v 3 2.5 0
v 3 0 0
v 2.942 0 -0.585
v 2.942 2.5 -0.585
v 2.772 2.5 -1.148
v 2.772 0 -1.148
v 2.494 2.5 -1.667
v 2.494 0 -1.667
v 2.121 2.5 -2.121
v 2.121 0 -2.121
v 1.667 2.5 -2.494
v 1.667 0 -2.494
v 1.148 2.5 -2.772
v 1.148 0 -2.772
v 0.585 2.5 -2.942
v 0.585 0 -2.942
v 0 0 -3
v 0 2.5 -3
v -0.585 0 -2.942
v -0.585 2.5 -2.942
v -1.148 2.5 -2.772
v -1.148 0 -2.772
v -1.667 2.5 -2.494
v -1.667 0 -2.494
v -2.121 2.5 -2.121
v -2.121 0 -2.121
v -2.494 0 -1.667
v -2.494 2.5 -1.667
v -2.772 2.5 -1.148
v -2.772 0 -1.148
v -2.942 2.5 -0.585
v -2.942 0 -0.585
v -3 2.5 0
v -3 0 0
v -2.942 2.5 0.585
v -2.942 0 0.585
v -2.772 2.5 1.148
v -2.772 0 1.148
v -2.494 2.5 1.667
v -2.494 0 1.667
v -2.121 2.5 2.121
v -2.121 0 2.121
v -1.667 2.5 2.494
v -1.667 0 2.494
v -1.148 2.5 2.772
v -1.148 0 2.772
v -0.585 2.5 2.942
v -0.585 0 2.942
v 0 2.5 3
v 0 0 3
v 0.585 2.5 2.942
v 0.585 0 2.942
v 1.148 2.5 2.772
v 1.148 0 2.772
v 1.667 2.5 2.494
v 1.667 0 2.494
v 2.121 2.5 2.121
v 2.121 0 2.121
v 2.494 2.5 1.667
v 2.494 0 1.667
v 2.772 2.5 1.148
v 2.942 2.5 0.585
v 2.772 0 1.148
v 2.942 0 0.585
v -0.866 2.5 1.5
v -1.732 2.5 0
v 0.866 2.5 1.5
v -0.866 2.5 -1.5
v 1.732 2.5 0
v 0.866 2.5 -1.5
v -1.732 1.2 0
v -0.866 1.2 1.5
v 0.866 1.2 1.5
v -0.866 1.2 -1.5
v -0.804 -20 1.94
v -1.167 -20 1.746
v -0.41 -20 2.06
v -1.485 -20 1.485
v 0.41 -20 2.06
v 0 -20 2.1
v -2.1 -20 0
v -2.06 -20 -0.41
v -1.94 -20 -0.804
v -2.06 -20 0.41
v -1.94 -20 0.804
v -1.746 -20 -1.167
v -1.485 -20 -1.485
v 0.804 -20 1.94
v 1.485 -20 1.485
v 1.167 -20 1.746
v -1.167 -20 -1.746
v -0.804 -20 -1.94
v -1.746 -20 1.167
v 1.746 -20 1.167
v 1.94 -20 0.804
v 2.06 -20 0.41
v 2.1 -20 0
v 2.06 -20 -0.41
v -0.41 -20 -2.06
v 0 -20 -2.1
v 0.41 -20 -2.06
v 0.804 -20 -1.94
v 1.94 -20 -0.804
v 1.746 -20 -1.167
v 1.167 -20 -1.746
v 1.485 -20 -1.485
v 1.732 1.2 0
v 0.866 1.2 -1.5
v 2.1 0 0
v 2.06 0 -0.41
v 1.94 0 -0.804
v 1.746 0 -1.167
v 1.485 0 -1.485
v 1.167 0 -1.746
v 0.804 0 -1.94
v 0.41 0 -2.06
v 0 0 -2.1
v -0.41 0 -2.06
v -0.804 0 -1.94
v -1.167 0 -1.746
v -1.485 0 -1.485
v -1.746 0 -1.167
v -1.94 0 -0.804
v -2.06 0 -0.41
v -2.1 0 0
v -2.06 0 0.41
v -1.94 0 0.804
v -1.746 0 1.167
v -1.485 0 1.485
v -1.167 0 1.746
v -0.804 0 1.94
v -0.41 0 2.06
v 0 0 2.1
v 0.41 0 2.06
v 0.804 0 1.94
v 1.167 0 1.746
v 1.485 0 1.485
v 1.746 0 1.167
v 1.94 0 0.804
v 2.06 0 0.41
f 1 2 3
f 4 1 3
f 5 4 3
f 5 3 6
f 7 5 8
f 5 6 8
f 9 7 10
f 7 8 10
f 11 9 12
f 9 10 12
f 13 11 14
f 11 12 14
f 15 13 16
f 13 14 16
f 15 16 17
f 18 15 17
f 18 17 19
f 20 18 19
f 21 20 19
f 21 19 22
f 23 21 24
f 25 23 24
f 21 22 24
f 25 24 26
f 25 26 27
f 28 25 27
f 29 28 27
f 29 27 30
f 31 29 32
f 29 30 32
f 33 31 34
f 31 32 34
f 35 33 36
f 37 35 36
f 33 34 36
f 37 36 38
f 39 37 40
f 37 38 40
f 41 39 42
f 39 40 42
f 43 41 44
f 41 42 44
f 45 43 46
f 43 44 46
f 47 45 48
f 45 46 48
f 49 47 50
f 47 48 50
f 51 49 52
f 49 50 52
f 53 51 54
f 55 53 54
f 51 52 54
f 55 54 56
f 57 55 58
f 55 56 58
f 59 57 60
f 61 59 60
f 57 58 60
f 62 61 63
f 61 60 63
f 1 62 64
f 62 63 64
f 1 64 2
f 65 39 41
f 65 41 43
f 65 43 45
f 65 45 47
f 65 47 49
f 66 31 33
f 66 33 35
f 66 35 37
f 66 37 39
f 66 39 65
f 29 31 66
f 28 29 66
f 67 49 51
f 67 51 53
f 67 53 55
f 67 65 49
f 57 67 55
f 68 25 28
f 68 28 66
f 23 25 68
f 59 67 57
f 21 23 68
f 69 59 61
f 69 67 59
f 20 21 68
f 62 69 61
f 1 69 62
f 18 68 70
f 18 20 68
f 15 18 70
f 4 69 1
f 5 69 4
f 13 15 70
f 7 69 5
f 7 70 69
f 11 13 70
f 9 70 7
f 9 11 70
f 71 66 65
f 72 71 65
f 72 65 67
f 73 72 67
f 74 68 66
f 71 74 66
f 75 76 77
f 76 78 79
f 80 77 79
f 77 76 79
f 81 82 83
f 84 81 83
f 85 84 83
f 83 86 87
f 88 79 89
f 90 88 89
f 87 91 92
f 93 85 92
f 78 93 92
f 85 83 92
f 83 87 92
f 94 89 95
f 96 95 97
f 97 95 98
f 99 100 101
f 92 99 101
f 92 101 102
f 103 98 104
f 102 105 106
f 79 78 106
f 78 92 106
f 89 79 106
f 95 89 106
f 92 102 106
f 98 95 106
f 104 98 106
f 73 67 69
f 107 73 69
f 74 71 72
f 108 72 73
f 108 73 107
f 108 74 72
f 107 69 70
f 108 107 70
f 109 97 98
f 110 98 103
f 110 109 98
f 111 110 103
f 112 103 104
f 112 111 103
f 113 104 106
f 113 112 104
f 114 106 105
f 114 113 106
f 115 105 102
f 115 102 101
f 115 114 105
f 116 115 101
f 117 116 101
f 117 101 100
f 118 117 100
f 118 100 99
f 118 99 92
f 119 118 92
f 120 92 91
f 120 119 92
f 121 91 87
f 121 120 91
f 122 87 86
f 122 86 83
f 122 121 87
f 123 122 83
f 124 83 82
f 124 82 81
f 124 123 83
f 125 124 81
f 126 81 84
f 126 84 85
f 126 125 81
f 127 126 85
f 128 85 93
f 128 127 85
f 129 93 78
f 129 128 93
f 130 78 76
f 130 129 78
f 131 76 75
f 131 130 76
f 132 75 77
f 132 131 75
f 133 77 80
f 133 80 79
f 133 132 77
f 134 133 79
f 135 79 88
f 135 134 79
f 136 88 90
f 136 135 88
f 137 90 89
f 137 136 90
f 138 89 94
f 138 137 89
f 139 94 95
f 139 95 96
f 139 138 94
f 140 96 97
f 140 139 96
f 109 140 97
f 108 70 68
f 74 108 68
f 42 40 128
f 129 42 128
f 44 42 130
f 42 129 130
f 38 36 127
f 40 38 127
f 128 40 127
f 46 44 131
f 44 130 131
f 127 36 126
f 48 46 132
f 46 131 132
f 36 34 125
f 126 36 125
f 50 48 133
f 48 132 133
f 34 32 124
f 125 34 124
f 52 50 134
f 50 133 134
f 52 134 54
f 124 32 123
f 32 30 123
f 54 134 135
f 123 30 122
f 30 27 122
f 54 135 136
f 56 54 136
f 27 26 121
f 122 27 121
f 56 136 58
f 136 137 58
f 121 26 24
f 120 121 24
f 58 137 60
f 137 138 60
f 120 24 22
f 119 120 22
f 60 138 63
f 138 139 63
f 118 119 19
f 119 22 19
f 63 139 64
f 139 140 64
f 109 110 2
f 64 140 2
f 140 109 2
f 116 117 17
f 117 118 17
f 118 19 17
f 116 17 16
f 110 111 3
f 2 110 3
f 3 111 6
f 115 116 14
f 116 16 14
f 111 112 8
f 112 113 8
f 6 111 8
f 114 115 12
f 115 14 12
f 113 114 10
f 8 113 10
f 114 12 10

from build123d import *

# Parameters (mm, degrees)
CROQUIS1_R              = 3
SALIENTE_EXTRUIR1_DEPTH = 2.5
CROQUIS2_R              = 2.1
SALIENTE_EXTRUIR2_DEPTH = 20
CORTAR_EXTRUIR1_DEPTH   = 2.5


with BuildPart() as part:
    # Croquis1 → Saliente-Extruir1 (new body)
    with BuildSketch(Plane(origin=(0, 0, 0), x_dir=(1, 0, 0), z_dir=(0, 1, 0))):
        Circle(CROQUIS1_R)
    extrude(amount=SALIENTE_EXTRUIR1_DEPTH)

    # Croquis2 → Saliente-Extruir2 (add)
    with BuildSketch(Plane(origin=(0, 0, 0), x_dir=(1, 0, 0), z_dir=(0, 1, 0))):
        Circle(CROQUIS2_R)
    extrude(amount=-SALIENTE_EXTRUIR2_DEPTH)

    # Croquis4 → Cortar-Extruir1 (cut)
    with BuildSketch(Plane(origin=(0, 3.7, 0), x_dir=(1, 0, 0), z_dir=(0, 1, 0))):
        Polygon((1.732050808, 0), (0.866025404, 1.5), (-0.866025404, 1.5), (-1.732050808, 0), (-0.866025404, -1.5), (0.866025404, -1.5), align=None)
    extrude(amount=-CORTAR_EXTRUIR1_DEPTH, mode=Mode.SUBTRACT)


solid = part.part
